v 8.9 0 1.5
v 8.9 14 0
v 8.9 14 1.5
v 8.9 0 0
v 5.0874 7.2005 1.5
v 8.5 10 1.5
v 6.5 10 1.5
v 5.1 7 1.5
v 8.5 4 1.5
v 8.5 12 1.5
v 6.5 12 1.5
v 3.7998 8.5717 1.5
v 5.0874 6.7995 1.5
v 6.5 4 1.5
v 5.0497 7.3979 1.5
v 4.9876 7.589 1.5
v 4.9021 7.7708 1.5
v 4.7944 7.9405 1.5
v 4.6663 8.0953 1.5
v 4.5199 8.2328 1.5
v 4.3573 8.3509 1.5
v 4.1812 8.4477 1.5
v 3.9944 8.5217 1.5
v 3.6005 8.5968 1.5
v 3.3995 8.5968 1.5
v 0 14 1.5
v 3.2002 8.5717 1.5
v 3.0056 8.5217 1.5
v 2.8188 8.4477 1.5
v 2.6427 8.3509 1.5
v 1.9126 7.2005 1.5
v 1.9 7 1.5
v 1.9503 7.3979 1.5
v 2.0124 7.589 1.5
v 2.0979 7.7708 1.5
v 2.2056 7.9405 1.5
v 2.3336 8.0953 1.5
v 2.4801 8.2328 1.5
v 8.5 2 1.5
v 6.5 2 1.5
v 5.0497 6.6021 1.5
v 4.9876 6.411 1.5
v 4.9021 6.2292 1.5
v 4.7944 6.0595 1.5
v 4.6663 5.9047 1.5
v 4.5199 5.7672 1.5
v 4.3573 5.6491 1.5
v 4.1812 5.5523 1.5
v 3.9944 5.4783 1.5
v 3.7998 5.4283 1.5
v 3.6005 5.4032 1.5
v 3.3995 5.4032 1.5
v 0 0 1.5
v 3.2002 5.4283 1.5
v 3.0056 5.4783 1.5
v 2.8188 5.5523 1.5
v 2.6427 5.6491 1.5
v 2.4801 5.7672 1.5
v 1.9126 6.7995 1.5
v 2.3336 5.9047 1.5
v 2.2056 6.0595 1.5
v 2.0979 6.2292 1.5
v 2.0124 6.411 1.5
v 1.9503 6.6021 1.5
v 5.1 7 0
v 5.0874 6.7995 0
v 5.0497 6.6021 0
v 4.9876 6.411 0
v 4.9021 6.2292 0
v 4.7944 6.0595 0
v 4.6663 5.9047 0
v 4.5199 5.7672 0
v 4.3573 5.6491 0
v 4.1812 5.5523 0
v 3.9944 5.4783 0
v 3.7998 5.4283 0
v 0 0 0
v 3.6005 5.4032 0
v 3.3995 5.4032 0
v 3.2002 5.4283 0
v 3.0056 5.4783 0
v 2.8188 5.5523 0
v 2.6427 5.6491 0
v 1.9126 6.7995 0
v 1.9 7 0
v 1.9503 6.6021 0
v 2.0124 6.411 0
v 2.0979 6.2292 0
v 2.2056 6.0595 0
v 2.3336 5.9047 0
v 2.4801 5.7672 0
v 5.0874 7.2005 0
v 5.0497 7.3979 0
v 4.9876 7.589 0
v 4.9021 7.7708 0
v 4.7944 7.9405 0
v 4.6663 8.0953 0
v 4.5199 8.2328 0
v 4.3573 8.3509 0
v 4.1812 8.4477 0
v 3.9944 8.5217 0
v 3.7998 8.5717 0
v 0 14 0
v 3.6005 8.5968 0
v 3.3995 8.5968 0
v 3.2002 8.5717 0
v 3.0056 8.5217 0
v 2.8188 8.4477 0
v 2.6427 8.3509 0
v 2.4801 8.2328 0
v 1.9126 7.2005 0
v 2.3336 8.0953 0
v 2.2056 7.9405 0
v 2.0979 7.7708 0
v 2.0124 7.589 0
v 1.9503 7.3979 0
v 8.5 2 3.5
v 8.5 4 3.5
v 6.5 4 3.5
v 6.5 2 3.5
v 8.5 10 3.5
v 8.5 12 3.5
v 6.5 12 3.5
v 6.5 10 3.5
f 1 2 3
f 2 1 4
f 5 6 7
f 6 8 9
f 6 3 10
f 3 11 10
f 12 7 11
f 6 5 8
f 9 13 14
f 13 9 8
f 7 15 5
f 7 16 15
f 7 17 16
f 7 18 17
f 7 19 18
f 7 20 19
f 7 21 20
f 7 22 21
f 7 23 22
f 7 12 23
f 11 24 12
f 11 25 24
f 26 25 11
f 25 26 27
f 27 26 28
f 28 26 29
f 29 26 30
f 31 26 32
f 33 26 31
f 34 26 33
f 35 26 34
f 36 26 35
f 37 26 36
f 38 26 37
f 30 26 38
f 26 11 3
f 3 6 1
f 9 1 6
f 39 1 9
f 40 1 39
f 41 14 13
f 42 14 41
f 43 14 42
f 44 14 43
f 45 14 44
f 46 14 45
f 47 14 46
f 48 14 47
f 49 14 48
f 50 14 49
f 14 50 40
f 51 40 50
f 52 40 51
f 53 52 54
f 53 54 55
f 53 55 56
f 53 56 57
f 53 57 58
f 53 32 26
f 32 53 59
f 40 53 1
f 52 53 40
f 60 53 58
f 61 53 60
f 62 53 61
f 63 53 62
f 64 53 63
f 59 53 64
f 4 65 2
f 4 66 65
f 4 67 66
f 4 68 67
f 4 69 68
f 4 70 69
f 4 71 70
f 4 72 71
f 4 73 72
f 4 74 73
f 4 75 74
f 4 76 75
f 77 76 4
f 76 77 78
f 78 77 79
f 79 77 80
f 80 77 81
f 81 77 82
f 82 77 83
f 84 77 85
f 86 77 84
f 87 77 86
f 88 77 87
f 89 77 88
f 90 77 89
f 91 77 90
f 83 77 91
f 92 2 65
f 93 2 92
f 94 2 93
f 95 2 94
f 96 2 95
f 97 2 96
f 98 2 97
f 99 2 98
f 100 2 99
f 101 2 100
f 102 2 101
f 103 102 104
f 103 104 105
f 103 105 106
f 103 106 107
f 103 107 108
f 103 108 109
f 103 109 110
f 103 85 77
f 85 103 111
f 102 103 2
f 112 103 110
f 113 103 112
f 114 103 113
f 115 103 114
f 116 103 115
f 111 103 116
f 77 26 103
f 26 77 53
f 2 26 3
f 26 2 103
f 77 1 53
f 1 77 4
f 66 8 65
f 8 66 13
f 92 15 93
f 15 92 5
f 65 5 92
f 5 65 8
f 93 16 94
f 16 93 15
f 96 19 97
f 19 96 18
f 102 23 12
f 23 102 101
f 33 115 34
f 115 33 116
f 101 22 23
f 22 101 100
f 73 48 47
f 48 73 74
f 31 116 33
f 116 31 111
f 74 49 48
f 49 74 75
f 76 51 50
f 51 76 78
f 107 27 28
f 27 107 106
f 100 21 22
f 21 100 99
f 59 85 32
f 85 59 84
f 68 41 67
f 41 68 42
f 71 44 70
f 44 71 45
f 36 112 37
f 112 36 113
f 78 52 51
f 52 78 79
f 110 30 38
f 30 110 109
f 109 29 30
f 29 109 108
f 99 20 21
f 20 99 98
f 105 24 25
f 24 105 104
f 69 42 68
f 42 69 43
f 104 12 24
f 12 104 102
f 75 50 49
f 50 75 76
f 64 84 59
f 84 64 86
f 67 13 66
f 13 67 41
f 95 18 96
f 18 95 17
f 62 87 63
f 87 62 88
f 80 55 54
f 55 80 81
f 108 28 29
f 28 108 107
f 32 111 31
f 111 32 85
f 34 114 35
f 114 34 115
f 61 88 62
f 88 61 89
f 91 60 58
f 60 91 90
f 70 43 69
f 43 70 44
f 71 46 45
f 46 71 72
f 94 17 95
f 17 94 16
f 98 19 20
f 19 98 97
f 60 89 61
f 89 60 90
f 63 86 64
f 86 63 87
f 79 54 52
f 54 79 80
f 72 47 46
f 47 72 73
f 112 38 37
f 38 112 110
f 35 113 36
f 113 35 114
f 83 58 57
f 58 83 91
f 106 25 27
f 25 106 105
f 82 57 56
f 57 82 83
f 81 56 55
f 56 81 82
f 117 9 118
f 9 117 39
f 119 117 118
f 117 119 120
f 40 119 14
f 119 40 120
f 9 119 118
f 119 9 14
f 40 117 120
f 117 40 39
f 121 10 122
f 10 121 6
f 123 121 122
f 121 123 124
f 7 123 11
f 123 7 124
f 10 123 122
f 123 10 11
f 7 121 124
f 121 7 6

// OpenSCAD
module prusa_enclosure_mount_washer() {
    difference() {
        // Base
        cube([8.9, 14, 1.5]);

        // Through screw hole
        translate([3.5, 7, -1])
        cylinder(h=3.5, d=3.2, $fn=50);
    }
    
    translate([7.5, 3, 2.5])
    cube([2, 2, 2], center=true);
    
    translate([7.5, 11, 2.5])
    cube([2, 2, 2], center=true);
}

prusa_enclosure_mount_washer();
